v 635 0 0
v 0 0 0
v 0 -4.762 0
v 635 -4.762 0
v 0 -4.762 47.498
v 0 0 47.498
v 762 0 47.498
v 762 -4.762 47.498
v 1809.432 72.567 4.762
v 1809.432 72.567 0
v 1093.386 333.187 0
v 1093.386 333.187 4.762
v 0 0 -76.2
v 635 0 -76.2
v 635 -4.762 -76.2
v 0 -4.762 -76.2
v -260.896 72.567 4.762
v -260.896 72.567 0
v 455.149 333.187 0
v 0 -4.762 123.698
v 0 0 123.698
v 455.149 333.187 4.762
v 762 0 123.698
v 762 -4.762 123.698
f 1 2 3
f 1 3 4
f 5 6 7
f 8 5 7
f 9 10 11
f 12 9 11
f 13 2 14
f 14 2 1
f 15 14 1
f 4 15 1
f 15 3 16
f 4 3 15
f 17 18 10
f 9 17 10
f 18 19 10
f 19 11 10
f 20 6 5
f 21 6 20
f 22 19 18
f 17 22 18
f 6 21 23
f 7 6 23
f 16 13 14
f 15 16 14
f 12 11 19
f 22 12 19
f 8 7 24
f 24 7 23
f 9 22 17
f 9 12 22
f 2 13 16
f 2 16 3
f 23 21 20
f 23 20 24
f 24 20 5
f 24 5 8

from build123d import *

# Parameters (mm, degrees)
F0_W     = 635
F0_H     = 76.2
F1_DEPTH = 4.7625
F2_W     = 762
F2_H     = 76.2
F3_DEPTH = 4.7625
F5_DEPTH = 4.7625


with BuildPart() as f1:
    # F0 (on Front) → F1 (new body)
    with BuildSketch(Plane.XZ):
        with Locations((317.5, -38.1)):
            Rectangle(F0_W, F0_H)
    extrude(amount=F1_DEPTH)


with BuildPart() as f3:
    # F2 (on Front) → F3 (new body)
    with BuildSketch(Plane.XZ):
        with Locations((381, 85.598487)):
            Rectangle(F2_W, F2_H)
    extrude(amount=F3_DEPTH)


with BuildPart() as f5:
    # F4 (on Top) → F5 (new body)
    with BuildSketch(Plane.XY):
        Polygon((455.149392, 333.186574), (-260.896385, 72.567225), (1809.432215, 72.567225), (1093.386438, 333.186574), align=None)
    extrude(amount=F5_DEPTH)


solid = Compound([f1.part, f3.part, f5.part])
